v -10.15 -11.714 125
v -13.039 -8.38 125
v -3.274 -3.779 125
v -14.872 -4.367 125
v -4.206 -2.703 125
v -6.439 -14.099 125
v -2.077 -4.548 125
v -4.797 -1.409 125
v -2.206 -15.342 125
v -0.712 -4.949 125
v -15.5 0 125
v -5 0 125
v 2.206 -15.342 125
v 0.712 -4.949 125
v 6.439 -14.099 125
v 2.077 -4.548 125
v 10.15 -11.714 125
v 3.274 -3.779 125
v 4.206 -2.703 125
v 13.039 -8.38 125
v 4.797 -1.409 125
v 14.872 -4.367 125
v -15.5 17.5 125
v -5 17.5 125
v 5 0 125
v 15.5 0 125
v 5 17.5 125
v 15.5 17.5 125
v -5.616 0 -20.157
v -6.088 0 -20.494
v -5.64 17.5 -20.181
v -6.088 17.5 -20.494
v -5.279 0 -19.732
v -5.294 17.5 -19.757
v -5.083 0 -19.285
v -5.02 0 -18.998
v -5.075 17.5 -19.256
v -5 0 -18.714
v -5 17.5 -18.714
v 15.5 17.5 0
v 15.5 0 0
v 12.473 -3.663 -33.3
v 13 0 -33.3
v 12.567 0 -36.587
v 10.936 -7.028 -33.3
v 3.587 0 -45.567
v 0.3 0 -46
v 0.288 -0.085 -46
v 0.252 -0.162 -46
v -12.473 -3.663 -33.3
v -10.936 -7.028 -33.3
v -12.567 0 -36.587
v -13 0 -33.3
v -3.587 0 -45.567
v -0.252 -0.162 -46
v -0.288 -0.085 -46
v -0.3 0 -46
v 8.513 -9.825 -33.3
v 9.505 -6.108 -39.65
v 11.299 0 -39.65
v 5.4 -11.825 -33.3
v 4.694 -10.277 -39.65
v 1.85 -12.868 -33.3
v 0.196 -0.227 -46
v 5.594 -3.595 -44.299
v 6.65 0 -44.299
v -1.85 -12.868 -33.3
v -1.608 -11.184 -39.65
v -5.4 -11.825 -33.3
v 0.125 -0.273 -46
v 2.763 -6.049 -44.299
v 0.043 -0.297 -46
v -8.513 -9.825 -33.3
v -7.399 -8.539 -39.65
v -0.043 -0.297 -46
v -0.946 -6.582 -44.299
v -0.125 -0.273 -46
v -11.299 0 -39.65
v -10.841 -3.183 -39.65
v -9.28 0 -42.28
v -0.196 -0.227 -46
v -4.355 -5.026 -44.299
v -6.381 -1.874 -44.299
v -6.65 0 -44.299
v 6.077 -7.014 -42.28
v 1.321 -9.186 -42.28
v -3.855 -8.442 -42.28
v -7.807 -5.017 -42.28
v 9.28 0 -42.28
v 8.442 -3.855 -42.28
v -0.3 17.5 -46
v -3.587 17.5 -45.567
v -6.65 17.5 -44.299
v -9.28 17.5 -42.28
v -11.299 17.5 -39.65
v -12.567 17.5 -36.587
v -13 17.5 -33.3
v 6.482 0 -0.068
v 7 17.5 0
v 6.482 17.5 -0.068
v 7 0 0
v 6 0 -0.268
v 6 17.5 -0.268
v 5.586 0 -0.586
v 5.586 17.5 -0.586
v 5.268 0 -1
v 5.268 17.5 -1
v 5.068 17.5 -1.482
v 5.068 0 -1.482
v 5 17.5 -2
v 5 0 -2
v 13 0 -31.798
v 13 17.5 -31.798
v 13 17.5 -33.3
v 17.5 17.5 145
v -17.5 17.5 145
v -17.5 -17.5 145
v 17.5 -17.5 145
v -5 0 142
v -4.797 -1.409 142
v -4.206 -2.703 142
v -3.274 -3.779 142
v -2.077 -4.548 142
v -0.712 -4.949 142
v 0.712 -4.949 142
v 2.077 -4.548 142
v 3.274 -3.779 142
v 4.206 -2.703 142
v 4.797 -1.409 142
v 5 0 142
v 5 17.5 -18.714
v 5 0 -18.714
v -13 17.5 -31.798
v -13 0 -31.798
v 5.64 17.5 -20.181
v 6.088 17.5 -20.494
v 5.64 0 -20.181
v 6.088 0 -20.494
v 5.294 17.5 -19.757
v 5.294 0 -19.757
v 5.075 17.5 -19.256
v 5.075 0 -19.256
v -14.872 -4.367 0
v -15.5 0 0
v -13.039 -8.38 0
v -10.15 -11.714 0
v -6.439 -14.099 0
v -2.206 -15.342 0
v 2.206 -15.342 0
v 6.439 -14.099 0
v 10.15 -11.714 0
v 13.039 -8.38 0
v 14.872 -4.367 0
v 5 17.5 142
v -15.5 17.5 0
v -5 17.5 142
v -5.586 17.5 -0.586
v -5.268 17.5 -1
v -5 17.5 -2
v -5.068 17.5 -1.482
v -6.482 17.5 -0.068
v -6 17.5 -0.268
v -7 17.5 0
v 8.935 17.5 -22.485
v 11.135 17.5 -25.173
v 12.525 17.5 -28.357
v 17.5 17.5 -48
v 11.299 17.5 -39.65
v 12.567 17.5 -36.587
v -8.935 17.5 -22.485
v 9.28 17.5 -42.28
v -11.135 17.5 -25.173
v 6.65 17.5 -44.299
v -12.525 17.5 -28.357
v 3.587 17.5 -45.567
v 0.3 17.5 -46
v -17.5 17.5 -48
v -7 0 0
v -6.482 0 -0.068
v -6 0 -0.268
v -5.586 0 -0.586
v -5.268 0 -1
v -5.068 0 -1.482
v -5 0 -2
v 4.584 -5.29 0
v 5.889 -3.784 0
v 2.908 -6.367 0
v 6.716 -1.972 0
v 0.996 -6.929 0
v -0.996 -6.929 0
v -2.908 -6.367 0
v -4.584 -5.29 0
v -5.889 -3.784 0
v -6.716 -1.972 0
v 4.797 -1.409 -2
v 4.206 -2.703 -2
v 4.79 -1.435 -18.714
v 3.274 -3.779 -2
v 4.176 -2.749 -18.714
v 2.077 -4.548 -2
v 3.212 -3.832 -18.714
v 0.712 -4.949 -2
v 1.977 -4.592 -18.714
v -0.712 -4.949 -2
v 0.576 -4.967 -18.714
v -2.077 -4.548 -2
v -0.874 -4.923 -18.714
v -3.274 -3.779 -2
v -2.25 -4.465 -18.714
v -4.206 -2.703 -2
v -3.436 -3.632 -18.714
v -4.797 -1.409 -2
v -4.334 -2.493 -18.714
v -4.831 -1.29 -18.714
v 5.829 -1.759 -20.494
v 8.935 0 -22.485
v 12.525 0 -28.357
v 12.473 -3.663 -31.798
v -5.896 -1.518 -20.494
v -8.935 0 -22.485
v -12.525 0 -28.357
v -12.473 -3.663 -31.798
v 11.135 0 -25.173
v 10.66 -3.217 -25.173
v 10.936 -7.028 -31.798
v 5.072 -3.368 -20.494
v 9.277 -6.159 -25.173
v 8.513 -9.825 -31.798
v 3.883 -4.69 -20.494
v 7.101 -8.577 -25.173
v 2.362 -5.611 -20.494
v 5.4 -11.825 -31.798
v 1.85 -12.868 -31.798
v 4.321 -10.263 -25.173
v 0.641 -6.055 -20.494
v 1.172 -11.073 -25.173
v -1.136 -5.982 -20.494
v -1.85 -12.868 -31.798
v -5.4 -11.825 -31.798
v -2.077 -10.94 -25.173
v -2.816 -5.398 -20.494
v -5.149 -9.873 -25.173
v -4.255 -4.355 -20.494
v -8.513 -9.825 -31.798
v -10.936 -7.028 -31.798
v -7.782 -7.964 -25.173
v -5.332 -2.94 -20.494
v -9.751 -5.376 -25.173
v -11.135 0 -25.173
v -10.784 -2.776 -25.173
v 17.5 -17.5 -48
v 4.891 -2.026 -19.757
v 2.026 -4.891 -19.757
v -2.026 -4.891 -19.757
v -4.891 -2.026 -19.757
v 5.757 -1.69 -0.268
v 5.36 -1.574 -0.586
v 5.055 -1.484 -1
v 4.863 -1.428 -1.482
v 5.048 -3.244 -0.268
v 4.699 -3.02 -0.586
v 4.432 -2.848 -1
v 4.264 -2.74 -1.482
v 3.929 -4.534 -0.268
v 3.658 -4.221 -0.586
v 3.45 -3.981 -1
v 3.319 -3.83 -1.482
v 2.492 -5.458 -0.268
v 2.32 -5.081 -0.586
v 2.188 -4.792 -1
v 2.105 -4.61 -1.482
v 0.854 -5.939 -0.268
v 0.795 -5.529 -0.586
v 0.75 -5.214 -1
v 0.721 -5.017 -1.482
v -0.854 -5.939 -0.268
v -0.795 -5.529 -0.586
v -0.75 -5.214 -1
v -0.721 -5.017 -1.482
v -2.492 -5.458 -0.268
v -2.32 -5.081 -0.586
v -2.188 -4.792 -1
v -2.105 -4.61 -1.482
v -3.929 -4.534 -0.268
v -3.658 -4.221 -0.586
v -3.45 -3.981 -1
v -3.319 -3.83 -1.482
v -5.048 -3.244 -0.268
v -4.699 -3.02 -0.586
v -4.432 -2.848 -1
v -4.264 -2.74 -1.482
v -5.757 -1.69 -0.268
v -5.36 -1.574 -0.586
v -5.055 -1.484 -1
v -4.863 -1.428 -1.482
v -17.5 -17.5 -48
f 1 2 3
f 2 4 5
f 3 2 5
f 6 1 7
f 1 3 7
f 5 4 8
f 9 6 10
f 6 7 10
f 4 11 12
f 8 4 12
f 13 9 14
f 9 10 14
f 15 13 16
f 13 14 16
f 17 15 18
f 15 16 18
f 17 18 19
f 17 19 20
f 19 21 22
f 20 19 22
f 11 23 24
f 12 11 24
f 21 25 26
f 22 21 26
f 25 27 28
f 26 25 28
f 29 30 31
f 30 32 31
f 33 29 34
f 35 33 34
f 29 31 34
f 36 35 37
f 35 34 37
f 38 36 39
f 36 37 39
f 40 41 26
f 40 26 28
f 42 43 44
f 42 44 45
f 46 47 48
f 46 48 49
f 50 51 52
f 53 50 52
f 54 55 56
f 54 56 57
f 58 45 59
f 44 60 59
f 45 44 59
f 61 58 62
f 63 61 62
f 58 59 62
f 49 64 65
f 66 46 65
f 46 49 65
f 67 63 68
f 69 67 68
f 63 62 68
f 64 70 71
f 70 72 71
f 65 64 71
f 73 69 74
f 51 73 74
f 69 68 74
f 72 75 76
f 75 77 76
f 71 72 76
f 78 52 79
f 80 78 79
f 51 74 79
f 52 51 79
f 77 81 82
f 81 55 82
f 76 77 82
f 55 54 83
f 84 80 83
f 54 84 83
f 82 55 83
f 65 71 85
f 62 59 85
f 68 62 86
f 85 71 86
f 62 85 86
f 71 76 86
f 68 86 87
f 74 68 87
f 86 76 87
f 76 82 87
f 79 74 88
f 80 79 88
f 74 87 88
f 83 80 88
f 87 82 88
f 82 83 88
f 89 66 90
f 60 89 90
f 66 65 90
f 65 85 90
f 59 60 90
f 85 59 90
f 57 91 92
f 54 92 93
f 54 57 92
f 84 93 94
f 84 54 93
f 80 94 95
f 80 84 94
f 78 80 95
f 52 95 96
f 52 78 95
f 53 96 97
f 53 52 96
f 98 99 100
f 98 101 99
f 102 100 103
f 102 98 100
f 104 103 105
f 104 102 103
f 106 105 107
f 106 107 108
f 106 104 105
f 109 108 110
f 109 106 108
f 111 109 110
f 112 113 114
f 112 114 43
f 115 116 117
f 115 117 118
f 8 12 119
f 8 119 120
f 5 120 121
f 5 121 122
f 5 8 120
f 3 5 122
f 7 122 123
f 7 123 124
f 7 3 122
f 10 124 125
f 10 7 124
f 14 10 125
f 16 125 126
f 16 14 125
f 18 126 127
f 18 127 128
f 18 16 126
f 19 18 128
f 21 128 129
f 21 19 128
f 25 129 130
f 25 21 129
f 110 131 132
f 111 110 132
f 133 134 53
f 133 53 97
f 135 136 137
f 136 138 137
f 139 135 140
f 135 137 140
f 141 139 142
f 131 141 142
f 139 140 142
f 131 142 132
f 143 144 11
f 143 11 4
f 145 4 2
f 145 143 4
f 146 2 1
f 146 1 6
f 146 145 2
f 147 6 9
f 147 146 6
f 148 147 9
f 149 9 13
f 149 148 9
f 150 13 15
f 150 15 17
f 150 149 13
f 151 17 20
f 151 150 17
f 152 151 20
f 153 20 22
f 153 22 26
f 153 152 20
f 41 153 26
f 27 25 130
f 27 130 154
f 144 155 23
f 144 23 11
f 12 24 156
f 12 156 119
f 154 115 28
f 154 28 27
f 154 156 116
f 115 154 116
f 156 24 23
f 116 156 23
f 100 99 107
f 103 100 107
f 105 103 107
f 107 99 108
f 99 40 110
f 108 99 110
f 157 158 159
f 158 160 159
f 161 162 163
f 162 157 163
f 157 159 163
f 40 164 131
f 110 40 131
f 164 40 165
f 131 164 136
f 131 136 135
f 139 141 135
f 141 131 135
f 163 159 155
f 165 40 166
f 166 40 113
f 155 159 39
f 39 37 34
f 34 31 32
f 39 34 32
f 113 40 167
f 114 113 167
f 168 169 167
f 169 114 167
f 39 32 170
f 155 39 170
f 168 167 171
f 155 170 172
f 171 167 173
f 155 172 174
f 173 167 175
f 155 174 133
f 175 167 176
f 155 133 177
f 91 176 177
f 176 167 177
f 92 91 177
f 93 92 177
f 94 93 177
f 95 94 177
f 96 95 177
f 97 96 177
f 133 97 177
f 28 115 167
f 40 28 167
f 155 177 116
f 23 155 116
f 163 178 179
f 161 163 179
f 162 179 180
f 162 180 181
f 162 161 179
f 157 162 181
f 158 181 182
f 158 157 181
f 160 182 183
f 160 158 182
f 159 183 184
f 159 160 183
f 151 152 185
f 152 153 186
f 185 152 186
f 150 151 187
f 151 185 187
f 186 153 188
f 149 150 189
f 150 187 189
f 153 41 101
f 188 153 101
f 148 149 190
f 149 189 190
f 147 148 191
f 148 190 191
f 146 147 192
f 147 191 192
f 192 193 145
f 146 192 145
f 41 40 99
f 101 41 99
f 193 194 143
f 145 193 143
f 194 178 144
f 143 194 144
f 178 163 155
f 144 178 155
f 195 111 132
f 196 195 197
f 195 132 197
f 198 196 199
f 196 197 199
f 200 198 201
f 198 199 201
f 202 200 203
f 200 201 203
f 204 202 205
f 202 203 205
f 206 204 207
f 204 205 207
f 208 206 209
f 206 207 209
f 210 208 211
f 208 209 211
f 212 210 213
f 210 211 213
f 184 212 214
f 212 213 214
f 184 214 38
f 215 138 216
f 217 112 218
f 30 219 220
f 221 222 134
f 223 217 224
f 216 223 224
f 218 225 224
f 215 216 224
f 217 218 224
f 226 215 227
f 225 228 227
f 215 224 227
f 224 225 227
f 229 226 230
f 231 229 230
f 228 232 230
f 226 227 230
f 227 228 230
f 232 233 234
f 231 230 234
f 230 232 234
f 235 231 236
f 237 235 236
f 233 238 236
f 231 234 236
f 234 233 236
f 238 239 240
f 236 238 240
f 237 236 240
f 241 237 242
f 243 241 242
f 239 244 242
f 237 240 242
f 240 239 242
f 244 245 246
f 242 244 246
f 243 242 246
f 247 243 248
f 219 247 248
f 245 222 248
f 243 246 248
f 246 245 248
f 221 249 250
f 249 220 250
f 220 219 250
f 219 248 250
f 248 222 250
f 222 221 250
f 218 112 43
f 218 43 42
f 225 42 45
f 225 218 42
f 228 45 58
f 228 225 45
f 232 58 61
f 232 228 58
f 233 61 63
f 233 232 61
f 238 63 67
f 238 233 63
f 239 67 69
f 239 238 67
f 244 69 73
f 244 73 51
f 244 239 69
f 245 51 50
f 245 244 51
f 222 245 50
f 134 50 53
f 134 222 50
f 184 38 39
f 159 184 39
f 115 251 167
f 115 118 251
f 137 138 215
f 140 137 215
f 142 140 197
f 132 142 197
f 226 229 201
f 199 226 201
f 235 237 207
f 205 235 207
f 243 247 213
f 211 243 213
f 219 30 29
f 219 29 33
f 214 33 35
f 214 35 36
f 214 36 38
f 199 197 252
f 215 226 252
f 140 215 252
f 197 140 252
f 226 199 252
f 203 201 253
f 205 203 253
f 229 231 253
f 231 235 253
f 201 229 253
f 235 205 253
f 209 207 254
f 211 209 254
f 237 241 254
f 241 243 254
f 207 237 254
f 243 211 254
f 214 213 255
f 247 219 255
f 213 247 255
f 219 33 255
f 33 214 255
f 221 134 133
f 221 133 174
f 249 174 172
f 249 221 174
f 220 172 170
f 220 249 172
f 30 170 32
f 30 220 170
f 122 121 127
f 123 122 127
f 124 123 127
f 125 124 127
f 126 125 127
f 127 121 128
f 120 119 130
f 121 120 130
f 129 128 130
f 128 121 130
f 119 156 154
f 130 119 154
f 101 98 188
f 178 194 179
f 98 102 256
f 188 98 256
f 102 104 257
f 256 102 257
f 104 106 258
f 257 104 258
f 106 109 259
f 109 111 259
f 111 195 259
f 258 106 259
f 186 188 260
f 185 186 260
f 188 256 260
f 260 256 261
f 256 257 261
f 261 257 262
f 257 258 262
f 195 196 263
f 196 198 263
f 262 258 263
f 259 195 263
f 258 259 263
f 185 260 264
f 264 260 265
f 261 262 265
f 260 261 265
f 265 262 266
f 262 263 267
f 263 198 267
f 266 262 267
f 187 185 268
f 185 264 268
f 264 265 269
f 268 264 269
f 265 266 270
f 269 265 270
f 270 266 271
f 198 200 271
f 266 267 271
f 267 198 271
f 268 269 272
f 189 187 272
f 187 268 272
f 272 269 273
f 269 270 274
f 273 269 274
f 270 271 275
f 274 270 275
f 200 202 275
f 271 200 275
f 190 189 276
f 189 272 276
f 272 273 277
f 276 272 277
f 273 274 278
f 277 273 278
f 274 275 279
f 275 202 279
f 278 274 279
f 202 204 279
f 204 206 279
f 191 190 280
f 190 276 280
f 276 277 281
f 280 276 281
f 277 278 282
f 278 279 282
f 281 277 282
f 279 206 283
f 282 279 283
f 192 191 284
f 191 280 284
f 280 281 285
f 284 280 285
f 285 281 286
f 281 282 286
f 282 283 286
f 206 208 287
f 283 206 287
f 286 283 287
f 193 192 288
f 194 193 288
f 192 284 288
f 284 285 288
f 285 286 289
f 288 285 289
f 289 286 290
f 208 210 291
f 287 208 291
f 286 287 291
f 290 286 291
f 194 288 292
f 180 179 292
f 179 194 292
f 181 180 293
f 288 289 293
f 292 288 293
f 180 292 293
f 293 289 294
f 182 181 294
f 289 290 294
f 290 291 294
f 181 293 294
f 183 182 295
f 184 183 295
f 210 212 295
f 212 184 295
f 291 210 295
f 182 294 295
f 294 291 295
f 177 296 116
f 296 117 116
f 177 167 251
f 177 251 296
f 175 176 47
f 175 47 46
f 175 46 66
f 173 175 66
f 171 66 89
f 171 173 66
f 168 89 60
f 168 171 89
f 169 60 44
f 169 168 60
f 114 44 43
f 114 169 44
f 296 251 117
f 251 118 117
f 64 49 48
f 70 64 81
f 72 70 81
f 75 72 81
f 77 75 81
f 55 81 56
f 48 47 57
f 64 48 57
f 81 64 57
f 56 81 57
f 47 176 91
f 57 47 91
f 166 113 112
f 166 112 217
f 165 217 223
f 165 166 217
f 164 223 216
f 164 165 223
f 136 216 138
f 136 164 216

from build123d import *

# Parameters (mm, degrees)
BOSS_EXTRUDE3_DEPTH = 125
SKETCH4_W           = 35
SKETCH4_H           = 35
BOSS_EXTRUDE4_DEPTH = 20
CUT_EXTRUDE2_DEPTH  = 17
SKETCH6_W           = 35
SKETCH6_H           = 35
BOSS_EXTRUDE5_DEPTH = 48
CUT_EXTRUDE3_START  = -20
CUT_EXTRUDE3_DEPTH  = 20
CUT_EXTRUDE4_DEPTH  = 26
FILLET1_R           = 12.7
FILLET2_R           = 2


with BuildPart() as part:
    # Sketch1 → Boss-Extrude3 (new body)
    with BuildSketch(Plane.XY):
        with BuildLine():
            Line((0, -17.5), (-17.5, -17.5))
            Line((-17.5, -17.5), (-17.5, 0))
            Line((-17.5, 0), (-17.5, 17.5))
            Line((-17.5, 17.5), (-15.5, 17.5))
            Line((-15.5, 17.5), (-15.5, 0))
            ThreePointArc((-15.5, 0), (0, -15.5), (15.5, 0))
            Line((15.5, 0), (15.5, 17.5))
            Line((15.5, 17.5), (17.5, 17.5))
            Line((17.5, 17.5), (17.5, 0))
            Line((17.5, 0), (17.5, -17.5))
            Line((17.5, -17.5), (0, -17.5))
        make_face()
    extrude(amount=BOSS_EXTRUDE3_DEPTH)

    # Sketch4 → Boss-Extrude4 (add)
    with BuildSketch(Plane.XY.offset(125)):
        Rectangle(SKETCH4_W, SKETCH4_H)
    extrude(amount=BOSS_EXTRUDE4_DEPTH)

    # Sketch5 → Cut-Extrude2 (cut)
    with BuildSketch(Plane(origin=(0, 0, 125), x_dir=(-1, 0, 0), z_dir=(0, 0, -1))):
        with BuildLine():
            Line((-5, 0), (-5, 17.5))
            Line((-5, 17.5), (5, 17.5))
            Line((5, 17.5), (5, 0))
            ThreePointArc((5, 0), (0, -5), (-5, 0))
        make_face()
    extrude(amount=-CUT_EXTRUDE2_DEPTH, mode=Mode.SUBTRACT)

    # Sketch6 → Boss-Extrude5 (add)
    with BuildSketch(Plane(origin=(0, 0, 0), x_dir=(-1, 0, 0), z_dir=(0, 0, -1))):
        Rectangle(SKETCH6_W, SKETCH6_H)
    extrude(amount=BOSS_EXTRUDE5_DEPTH)

    # Sketch7 → Cut-Extrude3 (cut)
    with BuildSketch(Plane.XY.offset(CUT_EXTRUDE3_START)):
        with BuildLine():
            Line((-5, 0), (-5, 17.5))
            Line((-5, 17.5), (5, 17.5))
            Line((5, 17.5), (5, 0))
            ThreePointArc((5, 0), (0, -5), (-5, 0))
        make_face()
    extrude(amount=CUT_EXTRUDE3_DEPTH, mode=Mode.SUBTRACT)

    # Sketch8 → Cut-Extrude4 (cut)
    with BuildSketch(Plane.XY.offset(-20)):
        with BuildLine():
            Line((-13, 0), (-13, 27.339362416))
            Line((-13, 27.339362416), (13, 27.339362416))
            Line((13, 27.339362416), (13, 0))
            ThreePointArc((13, 0), (0, -13), (-13, 0))
        make_face()
    extrude(amount=-CUT_EXTRUDE4_DEPTH, mode=Mode.SUBTRACT)

    # Fillet1
    # the kernel refuses this fillet: 12.7 mm, written as the material it adds along each edge
    with BuildSketch(Plane(origin=(13, 17.5, -20), x_dir=(-1, 0, 0), z_dir=(0, -1, 0)), Plane(origin=(-13, 0, -20), x_dir=(1, 0, 0), z_dir=(0, 1, 0))) as fillet1_piece_1:
        with BuildLine():
            CenterArc((12.7, 11.798304963), FILLET1_R, 180, 68.279526527)
            Line((0, 11.798304963), (-0.254, 11.798304963))
            Line((-0.254, 11.798304963), (-0.254, 0))
            Line((-0.254, 0), (0, -0.254))
            ThreePointArc((0, -0.254), (4, -0.254), (7.906, -0.235966099))
            Line((7.906, -0.235966099), (8, 0))
        make_face()
    extrude(amount=17.5)
    with BuildSketch(Plane(origin=(0, 0, -20), x_dir=(1, 0, 0), z_dir=(0, 1, 0))) as fillet1_piece_2:
        with BuildLine():
            CenterArc((0.3, 11.798304963), FILLET1_R, 291.720473473, 68.279526527)
            Line((13, 11.798304963), (13.254, 11.798304963))
            Line((13.254, 11.798304963), (13.254, 0))
            Line((13.254, 0), (13, -0.254))
            ThreePointArc((13, -0.254), (9, -0.254), (5.094, -0.235966099))
            Line((5.094, -0.235966099), (5, 0))
        make_face()
    revolve(axis=Axis((0, 0, -20), (0, 0, -1)), revolution_arc=180)
    with BuildSketch(Plane(origin=(13, 17.5, -46), x_dir=(0, 0, 1), z_dir=(0, -1, 0))) as fillet1_piece_3:
        with BuildLine():
            CenterArc((FILLET1_R, FILLET1_R), FILLET1_R, 180, 90)
            Line((0, FILLET1_R), (-FILLET1_R * 0.02, FILLET1_R))
            Line((-FILLET1_R * 0.02, FILLET1_R), (-FILLET1_R * 0.02, -FILLET1_R * 0.02))
            Line((-FILLET1_R * 0.02, -FILLET1_R * 0.02), (FILLET1_R, -FILLET1_R * 0.02))
            Line((FILLET1_R, -FILLET1_R * 0.02), (FILLET1_R, 0))
        make_face()
    extrude(amount=17.5)
    with BuildSketch(Plane(origin=(0, 0, -46), x_dir=(1, 0, 0), z_dir=(0, 1, 0))) as fillet1_piece_4:
        with BuildLine():
            CenterArc((13 - FILLET1_R, -FILLET1_R), FILLET1_R, 0, 90)
            Line((13, -FILLET1_R), (13 + FILLET1_R * 0.02, -FILLET1_R))
            Line((13 + FILLET1_R * 0.02, -FILLET1_R), (13 + FILLET1_R * 0.02, FILLET1_R * 0.02))
            Line((13 + FILLET1_R * 0.02, FILLET1_R * 0.02), (13 - FILLET1_R, FILLET1_R * 0.02))
            Line((13 - FILLET1_R, FILLET1_R * 0.02), (13 - FILLET1_R, 0))
        make_face()
    revolve(axis=Axis((0, 0, -46), (0, 0, -1)), revolution_arc=180)
    with BuildSketch(Plane(origin=(-13, 0, -46), x_dir=(1, 0, 0), z_dir=(0, 1, 0))) as fillet1_piece_5:
        with BuildLine():
            CenterArc((FILLET1_R, -FILLET1_R), FILLET1_R, 90, 90)
            Line((0, -FILLET1_R), (-FILLET1_R * 0.02, -FILLET1_R))
            Line((-FILLET1_R * 0.02, -FILLET1_R), (-FILLET1_R * 0.02, FILLET1_R * 0.02))
            Line((-FILLET1_R * 0.02, FILLET1_R * 0.02), (FILLET1_R, FILLET1_R * 0.02))
            Line((FILLET1_R, FILLET1_R * 0.02), (FILLET1_R, 0))
        make_face()
    extrude(amount=17.5)

    # Fillet2
    fillet2_edges = [part.edges().sort_by_distance(p)[0] for p in [
        (0, -5, -20),
        (-5, 8.75, -20),
        (5, 8.75, -20),
        (0, -5, 0),
        (5, 8.75, 0),
        (-5, 8.75, 0),
    ]]
    fillet(fillet2_edges, radius=FILLET2_R)


solid = part.part
